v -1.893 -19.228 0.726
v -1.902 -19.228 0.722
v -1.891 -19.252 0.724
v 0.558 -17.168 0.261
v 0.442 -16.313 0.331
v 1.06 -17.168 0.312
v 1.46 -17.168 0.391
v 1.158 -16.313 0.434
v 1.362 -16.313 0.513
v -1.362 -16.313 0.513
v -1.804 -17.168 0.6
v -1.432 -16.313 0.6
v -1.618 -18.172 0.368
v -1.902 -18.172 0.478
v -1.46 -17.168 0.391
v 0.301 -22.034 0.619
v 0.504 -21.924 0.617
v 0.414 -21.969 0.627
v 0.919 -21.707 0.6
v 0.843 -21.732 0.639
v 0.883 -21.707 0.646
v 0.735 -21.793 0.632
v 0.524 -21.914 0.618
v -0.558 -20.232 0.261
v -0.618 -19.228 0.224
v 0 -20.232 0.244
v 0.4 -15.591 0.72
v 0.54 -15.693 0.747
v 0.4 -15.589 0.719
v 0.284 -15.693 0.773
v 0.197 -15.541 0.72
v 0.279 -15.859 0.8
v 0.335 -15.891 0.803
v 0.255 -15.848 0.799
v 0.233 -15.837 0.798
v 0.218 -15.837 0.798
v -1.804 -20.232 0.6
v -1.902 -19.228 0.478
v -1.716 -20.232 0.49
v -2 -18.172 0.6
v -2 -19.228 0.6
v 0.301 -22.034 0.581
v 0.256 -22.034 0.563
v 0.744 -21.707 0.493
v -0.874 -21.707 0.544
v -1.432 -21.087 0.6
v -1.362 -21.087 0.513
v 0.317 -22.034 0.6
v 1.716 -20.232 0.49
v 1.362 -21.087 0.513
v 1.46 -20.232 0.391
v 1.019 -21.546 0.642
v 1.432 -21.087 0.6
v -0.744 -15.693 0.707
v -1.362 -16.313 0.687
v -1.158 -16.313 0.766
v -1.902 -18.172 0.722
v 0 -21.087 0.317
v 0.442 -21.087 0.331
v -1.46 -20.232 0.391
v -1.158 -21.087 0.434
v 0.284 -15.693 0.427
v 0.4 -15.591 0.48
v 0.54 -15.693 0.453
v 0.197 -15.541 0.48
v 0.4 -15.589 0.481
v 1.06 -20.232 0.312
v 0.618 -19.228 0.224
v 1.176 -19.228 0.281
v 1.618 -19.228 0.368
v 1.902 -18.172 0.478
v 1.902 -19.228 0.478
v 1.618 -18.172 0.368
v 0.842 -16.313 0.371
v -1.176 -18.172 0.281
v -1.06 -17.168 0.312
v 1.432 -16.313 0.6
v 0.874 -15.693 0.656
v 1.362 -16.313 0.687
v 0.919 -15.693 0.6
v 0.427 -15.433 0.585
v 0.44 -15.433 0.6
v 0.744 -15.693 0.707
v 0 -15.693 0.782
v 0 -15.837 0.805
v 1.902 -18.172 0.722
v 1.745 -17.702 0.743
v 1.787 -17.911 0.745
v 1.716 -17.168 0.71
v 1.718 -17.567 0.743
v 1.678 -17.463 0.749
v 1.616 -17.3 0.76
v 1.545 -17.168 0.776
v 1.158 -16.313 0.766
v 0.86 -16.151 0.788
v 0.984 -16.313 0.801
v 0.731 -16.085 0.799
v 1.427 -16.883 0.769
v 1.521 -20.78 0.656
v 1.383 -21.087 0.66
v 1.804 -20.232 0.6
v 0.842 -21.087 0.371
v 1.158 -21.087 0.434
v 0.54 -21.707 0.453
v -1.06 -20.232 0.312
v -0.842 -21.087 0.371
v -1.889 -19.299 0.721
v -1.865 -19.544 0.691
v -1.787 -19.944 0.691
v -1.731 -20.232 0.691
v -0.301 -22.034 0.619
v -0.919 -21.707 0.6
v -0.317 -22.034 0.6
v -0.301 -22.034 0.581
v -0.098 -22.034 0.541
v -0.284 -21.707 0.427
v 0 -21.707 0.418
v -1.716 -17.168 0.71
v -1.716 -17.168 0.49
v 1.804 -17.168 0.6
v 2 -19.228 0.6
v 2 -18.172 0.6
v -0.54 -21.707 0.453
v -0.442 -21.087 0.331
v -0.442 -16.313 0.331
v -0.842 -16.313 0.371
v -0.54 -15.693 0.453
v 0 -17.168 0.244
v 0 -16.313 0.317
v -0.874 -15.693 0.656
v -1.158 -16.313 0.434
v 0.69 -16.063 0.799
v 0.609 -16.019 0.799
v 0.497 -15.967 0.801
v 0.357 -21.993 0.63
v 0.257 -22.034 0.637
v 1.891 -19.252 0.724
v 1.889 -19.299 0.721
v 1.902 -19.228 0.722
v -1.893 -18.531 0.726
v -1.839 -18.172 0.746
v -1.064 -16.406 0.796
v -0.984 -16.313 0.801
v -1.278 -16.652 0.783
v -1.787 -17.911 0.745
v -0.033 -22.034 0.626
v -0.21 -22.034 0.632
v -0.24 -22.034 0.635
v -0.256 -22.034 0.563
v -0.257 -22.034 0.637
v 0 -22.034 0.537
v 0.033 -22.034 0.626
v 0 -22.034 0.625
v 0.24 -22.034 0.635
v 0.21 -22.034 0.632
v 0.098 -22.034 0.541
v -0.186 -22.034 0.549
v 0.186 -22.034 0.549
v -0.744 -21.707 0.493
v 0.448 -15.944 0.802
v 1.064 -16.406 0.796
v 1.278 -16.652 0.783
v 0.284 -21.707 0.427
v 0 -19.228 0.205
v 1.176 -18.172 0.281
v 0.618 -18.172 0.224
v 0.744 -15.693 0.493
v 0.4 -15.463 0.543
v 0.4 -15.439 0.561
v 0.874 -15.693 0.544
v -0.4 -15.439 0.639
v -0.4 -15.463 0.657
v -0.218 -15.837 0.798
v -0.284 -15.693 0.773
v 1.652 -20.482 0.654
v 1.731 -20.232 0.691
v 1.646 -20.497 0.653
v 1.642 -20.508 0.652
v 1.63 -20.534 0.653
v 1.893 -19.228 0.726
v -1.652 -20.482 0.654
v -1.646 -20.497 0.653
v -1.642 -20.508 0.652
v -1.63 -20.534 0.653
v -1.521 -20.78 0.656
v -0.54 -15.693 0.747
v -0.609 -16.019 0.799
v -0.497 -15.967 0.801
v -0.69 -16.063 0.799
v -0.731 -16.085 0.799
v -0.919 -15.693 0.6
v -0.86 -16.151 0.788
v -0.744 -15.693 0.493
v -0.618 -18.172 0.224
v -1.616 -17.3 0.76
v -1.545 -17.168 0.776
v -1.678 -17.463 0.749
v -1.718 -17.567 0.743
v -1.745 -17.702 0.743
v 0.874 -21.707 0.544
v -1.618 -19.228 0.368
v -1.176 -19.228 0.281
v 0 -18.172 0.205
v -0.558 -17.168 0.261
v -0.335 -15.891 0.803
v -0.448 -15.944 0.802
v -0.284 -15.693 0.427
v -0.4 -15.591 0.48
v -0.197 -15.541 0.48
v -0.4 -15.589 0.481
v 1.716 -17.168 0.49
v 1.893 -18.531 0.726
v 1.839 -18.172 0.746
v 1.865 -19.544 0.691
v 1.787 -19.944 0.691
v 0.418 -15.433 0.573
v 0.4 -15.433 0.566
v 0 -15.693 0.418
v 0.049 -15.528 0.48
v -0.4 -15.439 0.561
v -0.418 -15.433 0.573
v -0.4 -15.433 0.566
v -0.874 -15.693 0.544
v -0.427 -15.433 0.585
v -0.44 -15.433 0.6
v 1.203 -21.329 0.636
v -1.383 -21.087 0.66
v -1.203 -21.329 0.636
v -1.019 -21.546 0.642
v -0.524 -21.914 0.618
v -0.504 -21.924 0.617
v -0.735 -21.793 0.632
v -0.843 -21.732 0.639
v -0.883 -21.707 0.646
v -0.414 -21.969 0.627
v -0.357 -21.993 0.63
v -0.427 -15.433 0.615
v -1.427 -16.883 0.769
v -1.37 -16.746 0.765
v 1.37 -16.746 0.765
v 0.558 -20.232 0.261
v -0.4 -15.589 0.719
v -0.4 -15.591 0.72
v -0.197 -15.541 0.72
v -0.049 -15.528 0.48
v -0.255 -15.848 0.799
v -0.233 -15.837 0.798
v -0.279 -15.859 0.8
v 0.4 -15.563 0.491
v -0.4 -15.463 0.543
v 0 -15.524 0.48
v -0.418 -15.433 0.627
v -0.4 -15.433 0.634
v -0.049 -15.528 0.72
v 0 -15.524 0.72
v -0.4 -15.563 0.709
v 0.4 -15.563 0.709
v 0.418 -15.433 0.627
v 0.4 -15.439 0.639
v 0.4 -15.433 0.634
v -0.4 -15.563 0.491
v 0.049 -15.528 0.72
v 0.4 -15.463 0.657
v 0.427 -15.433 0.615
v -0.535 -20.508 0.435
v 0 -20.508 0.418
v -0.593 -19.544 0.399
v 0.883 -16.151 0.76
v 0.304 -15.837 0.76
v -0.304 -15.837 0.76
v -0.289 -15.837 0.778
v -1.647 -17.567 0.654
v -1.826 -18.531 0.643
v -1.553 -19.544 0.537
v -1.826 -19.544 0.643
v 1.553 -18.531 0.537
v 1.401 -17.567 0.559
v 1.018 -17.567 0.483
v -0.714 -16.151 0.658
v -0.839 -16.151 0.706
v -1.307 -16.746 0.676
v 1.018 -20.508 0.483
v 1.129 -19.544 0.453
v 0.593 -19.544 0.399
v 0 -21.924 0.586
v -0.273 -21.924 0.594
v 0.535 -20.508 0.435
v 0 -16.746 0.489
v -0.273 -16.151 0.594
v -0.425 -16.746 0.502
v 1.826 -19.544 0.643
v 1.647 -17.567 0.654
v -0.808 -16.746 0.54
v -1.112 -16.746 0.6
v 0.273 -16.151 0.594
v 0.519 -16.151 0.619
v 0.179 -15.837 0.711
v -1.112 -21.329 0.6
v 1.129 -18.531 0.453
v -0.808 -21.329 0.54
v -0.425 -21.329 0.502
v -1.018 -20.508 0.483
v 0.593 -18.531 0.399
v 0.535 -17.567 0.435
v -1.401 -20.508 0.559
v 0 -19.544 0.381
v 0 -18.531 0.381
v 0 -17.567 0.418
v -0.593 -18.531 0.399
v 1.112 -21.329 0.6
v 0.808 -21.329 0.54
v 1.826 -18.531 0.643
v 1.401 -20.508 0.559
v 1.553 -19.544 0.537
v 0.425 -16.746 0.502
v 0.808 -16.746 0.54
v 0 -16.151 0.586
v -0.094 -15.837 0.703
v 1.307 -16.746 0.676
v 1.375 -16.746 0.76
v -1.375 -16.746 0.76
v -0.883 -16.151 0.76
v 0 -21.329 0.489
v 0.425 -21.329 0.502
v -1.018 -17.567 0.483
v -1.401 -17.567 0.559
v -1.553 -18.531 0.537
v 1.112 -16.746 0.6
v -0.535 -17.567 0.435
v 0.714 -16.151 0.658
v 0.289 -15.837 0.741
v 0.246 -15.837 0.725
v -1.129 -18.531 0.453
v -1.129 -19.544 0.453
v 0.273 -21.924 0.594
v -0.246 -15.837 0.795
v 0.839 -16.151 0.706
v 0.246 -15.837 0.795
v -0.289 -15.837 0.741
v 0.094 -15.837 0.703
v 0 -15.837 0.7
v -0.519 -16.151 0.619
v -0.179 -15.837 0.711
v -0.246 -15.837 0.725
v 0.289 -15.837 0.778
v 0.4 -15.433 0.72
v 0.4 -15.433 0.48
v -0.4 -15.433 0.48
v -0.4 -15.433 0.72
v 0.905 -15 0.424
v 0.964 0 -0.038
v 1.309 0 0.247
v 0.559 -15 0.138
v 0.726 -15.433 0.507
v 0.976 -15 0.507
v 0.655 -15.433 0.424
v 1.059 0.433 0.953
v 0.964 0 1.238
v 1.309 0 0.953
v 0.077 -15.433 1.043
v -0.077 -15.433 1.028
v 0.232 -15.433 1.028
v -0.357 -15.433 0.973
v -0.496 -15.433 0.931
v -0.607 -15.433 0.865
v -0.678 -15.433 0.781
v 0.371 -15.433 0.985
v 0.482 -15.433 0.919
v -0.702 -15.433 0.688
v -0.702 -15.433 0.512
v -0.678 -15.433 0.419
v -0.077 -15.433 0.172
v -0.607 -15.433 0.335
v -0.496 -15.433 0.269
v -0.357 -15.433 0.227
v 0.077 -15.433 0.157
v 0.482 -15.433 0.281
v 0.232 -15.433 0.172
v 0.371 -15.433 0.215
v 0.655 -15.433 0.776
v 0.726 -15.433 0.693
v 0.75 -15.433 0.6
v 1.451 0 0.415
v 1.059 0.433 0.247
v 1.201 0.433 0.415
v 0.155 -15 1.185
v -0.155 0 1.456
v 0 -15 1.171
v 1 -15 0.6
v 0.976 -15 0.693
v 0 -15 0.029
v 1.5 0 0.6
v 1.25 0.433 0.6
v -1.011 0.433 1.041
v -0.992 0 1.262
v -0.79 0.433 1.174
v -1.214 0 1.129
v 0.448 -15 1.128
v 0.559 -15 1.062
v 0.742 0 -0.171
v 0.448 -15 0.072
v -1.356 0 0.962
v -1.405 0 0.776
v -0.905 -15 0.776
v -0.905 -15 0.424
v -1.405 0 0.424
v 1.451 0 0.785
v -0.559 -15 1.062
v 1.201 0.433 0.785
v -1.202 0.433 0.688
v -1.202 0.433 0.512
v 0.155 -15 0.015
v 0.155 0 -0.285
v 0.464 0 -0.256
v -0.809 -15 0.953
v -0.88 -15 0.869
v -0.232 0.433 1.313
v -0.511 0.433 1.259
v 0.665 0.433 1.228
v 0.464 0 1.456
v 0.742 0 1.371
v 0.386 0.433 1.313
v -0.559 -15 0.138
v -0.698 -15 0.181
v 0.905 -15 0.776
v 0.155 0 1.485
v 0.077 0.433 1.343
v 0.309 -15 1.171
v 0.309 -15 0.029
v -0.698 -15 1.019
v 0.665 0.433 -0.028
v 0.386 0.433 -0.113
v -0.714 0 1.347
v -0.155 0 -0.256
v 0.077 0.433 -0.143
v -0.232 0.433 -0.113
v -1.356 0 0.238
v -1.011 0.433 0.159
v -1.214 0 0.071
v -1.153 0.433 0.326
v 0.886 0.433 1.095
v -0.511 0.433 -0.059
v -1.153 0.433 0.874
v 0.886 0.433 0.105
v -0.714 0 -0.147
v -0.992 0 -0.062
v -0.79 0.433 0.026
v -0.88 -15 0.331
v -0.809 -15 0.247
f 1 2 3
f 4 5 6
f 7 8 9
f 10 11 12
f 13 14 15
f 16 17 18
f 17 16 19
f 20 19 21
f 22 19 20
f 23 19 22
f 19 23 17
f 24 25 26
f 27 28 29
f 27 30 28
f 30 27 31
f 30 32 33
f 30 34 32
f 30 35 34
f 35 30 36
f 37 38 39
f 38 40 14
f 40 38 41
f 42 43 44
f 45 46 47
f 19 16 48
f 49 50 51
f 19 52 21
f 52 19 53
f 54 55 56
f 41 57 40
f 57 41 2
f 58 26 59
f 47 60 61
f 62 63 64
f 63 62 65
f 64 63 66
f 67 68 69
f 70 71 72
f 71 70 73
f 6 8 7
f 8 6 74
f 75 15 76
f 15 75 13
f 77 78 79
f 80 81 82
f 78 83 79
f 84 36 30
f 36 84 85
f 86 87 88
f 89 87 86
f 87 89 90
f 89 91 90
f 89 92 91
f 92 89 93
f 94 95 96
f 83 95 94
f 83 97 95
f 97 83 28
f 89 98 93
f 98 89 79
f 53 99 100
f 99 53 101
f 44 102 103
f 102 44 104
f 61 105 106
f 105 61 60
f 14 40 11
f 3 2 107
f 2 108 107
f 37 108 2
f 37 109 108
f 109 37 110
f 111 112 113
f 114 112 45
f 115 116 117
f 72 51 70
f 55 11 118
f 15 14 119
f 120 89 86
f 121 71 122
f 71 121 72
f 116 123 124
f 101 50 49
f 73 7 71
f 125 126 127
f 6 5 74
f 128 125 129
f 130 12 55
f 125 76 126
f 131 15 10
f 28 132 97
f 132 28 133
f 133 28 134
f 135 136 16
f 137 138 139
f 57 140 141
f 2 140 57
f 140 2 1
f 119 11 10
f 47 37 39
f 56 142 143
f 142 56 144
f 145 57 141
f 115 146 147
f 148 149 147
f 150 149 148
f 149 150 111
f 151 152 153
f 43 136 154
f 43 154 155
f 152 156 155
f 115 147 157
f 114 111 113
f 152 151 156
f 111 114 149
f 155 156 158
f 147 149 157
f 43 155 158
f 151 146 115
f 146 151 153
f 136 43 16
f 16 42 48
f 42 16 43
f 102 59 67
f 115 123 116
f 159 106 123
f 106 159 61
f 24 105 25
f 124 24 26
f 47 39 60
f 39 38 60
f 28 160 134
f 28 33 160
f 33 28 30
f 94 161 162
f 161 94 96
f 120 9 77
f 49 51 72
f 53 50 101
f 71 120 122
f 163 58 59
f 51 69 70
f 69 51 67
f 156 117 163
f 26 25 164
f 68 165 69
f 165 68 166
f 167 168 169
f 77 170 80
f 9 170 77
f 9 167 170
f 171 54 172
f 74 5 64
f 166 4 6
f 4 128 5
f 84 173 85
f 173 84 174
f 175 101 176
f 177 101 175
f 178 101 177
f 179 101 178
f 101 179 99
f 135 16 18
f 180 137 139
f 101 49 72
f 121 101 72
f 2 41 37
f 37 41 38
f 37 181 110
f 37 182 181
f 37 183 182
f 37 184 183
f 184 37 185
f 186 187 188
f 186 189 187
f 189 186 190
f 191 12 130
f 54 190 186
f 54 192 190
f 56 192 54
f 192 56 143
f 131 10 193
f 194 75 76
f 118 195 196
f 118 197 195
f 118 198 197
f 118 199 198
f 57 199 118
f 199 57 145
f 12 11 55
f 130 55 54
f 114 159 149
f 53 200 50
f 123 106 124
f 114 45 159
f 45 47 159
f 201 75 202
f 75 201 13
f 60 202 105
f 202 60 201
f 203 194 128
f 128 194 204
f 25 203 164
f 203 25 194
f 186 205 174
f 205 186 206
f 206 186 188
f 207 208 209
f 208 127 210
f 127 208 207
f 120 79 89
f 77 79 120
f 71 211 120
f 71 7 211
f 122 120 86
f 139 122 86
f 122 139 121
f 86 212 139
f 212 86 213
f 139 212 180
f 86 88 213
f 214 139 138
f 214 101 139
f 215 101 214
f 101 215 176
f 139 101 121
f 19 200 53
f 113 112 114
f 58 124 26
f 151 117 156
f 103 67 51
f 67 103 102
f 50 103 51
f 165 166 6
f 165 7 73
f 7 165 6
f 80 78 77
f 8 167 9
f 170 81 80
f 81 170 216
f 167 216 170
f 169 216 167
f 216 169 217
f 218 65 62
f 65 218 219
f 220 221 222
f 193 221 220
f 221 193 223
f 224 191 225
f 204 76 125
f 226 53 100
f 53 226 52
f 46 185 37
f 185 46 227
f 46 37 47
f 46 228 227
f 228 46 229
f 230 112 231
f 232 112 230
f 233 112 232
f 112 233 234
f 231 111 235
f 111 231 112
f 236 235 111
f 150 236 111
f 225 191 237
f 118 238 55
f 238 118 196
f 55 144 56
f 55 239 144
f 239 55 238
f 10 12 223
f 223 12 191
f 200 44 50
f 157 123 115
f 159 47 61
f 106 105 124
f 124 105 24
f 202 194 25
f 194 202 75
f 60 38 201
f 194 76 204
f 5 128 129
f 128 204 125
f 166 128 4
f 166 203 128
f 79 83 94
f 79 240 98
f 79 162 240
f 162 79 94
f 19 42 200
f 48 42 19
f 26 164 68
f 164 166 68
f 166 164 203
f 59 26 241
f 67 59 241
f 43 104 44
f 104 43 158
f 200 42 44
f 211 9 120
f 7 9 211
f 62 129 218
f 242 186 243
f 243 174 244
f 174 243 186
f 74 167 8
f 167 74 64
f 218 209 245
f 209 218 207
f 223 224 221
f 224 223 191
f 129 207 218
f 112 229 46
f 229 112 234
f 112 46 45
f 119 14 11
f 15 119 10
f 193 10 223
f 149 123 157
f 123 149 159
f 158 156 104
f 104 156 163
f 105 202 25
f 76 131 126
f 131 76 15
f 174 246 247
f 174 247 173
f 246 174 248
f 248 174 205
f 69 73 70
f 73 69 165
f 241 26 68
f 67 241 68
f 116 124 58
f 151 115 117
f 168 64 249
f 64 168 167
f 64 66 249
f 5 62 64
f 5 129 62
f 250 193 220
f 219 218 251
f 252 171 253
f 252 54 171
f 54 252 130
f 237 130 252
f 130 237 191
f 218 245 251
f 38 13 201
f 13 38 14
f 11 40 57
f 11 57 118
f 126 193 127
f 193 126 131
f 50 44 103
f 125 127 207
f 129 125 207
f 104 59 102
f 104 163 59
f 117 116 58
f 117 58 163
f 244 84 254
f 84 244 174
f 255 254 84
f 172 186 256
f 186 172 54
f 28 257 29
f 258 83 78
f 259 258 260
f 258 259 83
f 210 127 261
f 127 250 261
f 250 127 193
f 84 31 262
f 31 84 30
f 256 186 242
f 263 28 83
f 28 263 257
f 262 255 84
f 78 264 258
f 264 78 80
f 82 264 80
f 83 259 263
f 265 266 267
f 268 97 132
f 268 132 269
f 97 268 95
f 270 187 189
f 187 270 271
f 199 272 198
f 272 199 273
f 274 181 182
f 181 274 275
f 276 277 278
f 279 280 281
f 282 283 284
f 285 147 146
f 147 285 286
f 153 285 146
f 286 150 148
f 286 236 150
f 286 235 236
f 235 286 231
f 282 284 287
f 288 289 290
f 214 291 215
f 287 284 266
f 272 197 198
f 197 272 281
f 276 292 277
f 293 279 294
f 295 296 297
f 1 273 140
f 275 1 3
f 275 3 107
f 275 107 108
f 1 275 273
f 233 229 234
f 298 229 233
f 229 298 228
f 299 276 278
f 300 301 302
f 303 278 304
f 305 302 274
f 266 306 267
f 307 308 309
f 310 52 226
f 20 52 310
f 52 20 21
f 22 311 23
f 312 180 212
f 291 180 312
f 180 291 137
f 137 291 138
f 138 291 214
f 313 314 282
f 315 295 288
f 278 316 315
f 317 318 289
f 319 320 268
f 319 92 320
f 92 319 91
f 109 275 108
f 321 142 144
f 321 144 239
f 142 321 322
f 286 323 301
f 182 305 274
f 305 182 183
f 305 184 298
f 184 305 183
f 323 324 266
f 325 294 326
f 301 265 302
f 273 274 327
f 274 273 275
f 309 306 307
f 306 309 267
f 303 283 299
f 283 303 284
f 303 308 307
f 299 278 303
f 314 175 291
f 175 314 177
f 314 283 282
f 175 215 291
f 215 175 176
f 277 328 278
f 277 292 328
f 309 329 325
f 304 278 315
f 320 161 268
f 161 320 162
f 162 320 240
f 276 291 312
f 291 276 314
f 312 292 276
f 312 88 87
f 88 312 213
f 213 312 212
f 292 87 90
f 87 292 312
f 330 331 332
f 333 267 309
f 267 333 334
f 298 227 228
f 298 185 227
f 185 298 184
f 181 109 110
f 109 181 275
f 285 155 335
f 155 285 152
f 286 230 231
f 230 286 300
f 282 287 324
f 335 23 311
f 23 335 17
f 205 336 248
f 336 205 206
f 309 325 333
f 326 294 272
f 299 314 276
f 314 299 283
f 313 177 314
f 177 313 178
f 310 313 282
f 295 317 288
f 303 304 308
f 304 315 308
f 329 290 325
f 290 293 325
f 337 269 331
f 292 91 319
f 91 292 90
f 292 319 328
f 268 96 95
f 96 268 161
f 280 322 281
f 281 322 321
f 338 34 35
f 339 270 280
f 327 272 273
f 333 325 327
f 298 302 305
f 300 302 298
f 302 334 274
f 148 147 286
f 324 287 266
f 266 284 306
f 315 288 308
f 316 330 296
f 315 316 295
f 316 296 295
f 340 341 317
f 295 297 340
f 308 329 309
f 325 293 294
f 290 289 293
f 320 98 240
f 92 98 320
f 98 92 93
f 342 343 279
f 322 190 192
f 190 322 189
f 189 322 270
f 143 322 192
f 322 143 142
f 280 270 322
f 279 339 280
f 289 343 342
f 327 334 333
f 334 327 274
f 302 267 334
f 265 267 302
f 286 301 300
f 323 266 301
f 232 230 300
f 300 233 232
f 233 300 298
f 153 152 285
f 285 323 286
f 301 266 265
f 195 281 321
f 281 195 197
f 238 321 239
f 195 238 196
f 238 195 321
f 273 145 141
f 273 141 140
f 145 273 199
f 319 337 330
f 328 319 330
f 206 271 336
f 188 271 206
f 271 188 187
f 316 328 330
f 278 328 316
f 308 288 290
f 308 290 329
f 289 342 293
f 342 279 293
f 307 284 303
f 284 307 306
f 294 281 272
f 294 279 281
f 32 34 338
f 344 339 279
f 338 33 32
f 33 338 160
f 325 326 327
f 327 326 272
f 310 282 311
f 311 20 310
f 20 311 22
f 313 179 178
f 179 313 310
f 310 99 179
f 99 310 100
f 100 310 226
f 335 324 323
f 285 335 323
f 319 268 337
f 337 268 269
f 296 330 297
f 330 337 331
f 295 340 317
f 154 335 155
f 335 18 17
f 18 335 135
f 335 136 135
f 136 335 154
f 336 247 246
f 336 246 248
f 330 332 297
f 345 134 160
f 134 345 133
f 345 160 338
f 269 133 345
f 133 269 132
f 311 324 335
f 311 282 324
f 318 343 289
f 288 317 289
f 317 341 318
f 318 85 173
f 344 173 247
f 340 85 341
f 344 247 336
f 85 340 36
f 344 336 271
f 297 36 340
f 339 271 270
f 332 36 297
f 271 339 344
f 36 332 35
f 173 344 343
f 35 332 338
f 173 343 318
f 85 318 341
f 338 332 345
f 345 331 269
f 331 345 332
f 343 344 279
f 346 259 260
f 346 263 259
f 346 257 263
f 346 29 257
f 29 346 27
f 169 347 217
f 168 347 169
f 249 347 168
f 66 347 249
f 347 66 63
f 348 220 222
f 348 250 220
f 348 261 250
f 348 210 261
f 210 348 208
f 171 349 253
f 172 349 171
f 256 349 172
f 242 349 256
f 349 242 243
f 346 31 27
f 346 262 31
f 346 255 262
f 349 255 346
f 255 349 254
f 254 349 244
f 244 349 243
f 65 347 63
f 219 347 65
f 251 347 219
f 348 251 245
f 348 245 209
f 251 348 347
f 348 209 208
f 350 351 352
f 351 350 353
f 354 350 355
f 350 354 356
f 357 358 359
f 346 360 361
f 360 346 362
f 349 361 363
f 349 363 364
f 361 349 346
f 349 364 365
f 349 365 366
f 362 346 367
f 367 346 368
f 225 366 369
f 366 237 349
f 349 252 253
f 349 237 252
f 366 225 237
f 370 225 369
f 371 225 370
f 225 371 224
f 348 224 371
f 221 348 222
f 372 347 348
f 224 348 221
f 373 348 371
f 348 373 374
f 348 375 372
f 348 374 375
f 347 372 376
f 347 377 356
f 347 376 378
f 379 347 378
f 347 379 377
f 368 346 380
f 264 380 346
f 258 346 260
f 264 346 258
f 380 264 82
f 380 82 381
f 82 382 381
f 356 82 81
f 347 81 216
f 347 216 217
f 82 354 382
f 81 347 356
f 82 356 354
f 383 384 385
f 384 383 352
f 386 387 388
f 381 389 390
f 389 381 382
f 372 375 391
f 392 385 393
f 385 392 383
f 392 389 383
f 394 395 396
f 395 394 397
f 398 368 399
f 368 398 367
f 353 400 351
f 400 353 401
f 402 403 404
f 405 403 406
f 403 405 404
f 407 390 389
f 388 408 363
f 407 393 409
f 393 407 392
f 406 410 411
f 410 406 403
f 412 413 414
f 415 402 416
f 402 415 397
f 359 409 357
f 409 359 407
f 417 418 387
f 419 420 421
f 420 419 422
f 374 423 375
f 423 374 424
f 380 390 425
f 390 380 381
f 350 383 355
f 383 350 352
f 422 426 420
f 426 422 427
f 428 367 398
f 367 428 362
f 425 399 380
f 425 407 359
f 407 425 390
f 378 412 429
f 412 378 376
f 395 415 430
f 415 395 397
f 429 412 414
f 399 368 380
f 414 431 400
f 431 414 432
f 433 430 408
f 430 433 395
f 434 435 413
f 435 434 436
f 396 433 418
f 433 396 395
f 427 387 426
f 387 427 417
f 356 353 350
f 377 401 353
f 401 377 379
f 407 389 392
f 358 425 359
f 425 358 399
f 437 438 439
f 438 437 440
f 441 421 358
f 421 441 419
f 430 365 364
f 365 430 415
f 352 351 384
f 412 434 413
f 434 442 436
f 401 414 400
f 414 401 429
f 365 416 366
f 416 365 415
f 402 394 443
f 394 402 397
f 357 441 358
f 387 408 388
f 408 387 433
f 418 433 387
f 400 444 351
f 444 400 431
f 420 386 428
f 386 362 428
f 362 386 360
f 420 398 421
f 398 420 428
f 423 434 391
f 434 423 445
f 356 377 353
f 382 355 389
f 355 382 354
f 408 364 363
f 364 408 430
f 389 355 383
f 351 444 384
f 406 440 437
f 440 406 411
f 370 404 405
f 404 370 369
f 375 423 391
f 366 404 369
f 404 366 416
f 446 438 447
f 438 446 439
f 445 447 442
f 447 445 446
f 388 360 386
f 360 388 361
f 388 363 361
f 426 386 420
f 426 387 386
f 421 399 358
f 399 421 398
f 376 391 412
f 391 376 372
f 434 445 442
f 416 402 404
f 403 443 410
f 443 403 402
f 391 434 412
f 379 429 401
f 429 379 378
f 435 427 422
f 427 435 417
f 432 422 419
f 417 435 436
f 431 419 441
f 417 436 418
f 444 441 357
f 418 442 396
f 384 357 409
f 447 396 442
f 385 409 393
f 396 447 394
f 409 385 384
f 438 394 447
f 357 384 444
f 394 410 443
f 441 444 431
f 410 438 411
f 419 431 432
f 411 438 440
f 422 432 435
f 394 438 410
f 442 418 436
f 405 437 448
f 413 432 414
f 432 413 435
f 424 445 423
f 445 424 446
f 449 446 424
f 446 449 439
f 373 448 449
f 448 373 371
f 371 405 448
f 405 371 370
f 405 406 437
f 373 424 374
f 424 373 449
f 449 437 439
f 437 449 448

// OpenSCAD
/**
 * @author Robotia
 * @brief Silverware
 */


// Spoon
handle(0,0,0,0);

// Fork
//handle(-6,0,0,1);

// Knife
//handle(6,0,0,2);

module handle(x,y,z,type=0) {
    rotate([90,0,0]) {
        scale([1, 0.6, 1]) {
            translate([x, y + 1, z]) {
                minkowski() {
                    sphere(r=0.5);
                    cylinder(r1=1, r2=0.5, h=15, $fn=20);
                }
                translate([0, 0, 15.2]) {
                    cube([0.8 ,0.4, 1], center=true);
                    translate([0, 0, 1.5]) {
                        // Spoon
                        if(type==0) {
                            translate([0,0,2])
                            resize([4,1,6.667])
                            difference() {
                                sphere(r=1, $fn=20);
                                translate([0,0.4,0.1])
                                sphere(r=0.96, $fn=20);
                            }
                        } else if(type==1) {
                            translate([0,0,1.6])
                            resize([3,1,5])
                            difference() {
                                sphere(r=1, $fn=20);
                                translate([0,0.7,0])
                                cube([2,1,2], center=true);
                                translate([-1,0,0])
                                cube([2,2,2], center=true);
                            }
                        } else if(type==2) {
                        }
                    }
                }
            }
        }
    }
}
